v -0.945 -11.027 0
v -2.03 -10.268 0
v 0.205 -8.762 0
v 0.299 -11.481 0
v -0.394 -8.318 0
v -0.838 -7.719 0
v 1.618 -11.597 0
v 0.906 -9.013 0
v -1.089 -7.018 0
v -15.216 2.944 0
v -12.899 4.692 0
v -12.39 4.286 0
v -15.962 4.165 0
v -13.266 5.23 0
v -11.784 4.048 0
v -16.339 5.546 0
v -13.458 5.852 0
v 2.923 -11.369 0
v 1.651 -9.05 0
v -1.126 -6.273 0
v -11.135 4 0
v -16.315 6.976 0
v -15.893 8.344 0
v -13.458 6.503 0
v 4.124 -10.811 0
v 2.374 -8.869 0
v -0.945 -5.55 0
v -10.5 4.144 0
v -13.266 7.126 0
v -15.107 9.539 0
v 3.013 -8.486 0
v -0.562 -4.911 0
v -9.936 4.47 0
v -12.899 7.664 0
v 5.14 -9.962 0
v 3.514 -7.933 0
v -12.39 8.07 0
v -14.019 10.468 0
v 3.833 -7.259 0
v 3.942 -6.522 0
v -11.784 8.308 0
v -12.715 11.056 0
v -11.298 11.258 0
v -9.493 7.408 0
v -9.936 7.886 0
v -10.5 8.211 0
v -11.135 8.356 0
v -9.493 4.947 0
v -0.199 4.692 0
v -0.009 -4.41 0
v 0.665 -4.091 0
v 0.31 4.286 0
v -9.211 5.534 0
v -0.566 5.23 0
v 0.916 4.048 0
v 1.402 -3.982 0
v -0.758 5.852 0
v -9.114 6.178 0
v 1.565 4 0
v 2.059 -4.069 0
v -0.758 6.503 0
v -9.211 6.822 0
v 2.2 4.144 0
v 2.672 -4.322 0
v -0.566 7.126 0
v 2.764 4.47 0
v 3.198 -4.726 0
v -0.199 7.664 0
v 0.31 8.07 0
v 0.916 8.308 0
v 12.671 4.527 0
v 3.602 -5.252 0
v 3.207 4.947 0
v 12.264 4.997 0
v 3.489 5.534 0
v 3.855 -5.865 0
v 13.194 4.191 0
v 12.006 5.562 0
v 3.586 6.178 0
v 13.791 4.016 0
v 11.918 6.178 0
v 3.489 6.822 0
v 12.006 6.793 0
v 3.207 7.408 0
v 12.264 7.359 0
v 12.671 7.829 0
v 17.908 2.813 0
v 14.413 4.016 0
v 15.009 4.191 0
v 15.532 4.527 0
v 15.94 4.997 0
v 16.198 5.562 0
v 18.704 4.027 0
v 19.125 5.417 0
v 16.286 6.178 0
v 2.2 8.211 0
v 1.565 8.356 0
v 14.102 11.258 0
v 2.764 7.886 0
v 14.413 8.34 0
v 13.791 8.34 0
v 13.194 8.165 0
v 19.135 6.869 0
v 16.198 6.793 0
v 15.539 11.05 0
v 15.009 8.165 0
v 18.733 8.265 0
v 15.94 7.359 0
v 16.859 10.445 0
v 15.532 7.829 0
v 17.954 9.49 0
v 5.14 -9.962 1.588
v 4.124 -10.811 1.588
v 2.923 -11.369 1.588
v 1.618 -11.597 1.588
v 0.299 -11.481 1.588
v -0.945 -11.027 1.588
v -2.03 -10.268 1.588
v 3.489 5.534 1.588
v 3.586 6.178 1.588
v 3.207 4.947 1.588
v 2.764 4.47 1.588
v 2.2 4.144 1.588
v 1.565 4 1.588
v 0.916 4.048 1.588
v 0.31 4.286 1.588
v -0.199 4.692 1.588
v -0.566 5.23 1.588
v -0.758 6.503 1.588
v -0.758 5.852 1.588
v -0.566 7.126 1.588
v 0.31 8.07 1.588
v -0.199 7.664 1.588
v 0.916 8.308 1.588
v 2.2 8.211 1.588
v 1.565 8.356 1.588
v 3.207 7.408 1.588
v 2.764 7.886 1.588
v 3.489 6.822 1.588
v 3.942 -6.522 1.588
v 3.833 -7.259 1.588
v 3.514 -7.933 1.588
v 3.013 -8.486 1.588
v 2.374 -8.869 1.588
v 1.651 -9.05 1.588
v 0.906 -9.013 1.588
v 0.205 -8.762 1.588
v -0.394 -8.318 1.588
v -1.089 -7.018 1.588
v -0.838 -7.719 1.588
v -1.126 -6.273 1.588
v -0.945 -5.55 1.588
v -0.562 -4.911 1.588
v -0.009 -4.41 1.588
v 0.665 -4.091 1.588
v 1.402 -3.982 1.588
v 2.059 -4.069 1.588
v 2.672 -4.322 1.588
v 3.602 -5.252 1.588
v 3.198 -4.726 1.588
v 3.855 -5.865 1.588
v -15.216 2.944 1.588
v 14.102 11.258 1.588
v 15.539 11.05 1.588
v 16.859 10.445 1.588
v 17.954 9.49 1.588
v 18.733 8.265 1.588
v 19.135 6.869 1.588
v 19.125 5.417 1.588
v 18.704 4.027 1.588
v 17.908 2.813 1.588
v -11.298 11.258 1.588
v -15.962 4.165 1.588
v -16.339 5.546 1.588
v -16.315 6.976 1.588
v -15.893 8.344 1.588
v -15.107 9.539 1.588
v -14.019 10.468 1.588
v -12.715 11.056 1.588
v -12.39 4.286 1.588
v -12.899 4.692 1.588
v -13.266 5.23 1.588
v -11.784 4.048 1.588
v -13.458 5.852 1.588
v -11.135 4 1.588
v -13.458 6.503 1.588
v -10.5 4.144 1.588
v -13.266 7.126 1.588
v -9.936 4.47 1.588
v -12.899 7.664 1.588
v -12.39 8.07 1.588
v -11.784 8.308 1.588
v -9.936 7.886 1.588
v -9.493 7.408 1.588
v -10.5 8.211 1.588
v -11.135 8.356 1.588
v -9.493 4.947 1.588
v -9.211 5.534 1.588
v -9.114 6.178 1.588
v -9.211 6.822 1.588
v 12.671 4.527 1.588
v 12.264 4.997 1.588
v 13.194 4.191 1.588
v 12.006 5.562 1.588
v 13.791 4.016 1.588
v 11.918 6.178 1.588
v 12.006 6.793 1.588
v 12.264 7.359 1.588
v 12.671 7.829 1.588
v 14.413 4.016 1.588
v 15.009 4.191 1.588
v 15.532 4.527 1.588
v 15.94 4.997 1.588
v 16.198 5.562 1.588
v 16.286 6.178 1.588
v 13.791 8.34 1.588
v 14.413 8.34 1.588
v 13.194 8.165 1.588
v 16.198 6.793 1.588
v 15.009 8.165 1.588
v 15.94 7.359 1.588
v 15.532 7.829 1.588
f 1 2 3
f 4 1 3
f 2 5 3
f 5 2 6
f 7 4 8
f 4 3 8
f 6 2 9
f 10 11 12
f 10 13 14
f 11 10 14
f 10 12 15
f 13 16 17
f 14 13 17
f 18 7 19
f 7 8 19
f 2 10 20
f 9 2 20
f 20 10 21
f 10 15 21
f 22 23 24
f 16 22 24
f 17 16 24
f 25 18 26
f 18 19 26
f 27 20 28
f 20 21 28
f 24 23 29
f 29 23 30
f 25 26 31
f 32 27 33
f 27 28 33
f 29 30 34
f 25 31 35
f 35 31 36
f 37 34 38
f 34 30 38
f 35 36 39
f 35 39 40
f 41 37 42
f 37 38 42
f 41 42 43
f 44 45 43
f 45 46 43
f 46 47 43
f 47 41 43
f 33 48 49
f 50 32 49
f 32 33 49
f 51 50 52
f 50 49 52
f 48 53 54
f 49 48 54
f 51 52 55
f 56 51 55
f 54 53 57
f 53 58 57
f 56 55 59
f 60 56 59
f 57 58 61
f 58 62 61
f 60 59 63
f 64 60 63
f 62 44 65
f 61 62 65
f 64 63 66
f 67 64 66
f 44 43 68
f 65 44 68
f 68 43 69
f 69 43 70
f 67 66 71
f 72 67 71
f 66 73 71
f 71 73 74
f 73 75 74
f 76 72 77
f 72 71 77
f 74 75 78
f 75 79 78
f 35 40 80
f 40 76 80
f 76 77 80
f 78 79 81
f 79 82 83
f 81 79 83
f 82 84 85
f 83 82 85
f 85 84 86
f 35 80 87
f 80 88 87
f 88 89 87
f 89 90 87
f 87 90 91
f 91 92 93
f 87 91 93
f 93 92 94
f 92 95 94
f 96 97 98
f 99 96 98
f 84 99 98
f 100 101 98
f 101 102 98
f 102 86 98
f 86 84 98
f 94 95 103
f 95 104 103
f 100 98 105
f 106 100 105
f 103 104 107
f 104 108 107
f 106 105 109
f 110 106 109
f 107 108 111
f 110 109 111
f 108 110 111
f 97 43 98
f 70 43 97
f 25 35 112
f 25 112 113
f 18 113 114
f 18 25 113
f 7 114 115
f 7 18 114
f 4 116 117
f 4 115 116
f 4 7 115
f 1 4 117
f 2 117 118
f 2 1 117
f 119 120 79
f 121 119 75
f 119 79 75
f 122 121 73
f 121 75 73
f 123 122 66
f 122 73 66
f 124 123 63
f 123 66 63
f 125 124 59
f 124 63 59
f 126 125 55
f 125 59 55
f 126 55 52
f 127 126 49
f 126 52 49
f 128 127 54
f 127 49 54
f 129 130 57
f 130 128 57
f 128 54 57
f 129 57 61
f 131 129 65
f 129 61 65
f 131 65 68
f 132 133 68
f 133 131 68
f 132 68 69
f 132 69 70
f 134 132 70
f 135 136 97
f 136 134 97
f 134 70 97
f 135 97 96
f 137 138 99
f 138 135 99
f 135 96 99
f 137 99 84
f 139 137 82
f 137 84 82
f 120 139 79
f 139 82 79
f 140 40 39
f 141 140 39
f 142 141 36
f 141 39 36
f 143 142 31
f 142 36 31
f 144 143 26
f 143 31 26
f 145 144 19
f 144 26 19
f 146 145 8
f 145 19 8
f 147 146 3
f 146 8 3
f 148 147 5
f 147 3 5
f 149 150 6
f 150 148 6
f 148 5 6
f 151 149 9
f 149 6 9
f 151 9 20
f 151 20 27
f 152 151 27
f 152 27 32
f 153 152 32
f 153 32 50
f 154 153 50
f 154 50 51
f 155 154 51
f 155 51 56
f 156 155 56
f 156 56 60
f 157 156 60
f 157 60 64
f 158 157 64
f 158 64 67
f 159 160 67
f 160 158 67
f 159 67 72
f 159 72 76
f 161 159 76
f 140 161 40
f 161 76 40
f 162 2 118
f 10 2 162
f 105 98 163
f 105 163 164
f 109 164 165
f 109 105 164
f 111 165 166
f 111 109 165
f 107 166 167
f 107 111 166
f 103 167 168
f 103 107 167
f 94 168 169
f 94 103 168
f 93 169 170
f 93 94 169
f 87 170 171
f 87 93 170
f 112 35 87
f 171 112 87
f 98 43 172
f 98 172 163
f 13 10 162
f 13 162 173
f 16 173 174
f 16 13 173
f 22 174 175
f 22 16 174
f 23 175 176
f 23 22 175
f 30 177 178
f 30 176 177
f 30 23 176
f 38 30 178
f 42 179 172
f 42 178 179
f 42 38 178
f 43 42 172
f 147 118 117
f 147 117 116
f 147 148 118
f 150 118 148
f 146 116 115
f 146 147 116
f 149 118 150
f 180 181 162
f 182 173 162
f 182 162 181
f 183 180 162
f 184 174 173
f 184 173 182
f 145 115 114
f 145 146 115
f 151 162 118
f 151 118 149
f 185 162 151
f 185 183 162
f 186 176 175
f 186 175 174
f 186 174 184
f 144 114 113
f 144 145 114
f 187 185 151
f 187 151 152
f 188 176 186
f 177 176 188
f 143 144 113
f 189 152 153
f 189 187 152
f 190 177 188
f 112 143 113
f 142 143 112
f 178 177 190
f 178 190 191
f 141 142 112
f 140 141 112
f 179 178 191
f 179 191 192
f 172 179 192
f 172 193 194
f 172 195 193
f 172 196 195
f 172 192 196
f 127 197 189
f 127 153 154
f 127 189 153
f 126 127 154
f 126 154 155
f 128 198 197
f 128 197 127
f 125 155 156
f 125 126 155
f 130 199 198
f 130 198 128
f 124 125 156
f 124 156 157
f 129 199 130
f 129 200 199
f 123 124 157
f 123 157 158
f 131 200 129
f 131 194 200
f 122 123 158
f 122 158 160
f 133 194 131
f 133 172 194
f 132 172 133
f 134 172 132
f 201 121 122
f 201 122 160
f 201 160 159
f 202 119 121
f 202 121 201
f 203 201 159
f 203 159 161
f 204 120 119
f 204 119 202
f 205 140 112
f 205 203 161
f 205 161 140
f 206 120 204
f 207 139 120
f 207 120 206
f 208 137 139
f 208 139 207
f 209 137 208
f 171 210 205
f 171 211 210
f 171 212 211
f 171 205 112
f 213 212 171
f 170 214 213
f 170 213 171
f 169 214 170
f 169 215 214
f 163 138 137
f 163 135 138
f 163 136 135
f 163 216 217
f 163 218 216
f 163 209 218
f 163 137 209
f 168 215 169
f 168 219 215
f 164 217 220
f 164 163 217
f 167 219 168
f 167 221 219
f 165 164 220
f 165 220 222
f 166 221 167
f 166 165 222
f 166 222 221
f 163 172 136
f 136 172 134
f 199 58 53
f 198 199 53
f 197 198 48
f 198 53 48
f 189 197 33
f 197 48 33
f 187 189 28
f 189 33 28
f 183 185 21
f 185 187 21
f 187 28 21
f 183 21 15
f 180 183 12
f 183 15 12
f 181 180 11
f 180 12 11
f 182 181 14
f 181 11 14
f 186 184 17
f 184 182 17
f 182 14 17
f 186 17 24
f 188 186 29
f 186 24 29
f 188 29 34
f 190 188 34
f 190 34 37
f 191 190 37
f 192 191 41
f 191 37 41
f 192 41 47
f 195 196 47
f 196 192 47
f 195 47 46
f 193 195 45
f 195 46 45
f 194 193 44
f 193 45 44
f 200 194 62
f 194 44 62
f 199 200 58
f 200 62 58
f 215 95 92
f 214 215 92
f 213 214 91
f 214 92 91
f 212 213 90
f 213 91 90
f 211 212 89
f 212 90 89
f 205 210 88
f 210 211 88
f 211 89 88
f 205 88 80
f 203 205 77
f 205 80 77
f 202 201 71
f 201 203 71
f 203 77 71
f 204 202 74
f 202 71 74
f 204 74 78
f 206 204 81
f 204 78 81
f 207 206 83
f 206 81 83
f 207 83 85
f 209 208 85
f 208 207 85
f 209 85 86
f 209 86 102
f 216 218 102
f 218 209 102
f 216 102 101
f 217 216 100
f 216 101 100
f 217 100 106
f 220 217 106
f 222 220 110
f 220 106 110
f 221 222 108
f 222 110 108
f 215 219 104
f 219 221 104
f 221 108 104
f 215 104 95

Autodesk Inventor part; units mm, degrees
ref_plane "YZ Plane" through (0, 0, 0) normal (1, 0, 0) x (0, 1, 0)
ref_plane "XZ Plane" through (0, 0, 0) normal (0, 1, 0) x (-1, 0, 0)
ref_plane "XY Plane" through (0, 0, 0) normal (0, 0, 1) x (1, 0, 0)
sketch "Sketch3" plane through (0, 0, 0) normal (0, 0, 1) x (1, 0, 0)
  circle A0 centre (1.4019, 6.1779) radius 2.1844
  circle A1 centre (-11.2981, 6.1779) radius 2.1844
  circle A2 centre (-23.9981, 6.1779) radius 2.1844
  circle A3 centre (14.1019, 6.1779) radius 2.1844
  line L0 (-11.2981, 6.1779) -> (1.4019, 6.1779)
  line L1 (1.4019, 6.1779) -> (14.1019, 6.1779)
  circle A4 centre (-11.2981, 6.1779) radius 5.08
  circle A5 centre (1.4019, 6.1779) radius 5.08
  circle A6 centre (14.1019, 6.1779) radius 5.08
  line L2 (-11.2981, 11.2579) -> (1.4019, 11.2579)
  line L3 (1.4019, 11.2579) -> (14.1019, 11.2579)
  line L4 (1.4019, 6.1779) -> (1.4019, -6.5221)
  circle A7 centre (1.4019, -6.5221) radius 2.54
  circle A8 centre (1.4019, -6.5221) radius 5.08
  line L5 (-2.0302, -10.2675) -> (-18.1161, 5.8501)
  line L6 (5.1405, -9.9615) -> (17.9077, 2.813)
  point P0 (0, 0)
  point P1 (-15.8845, 3.9935)
  point P2 (18.6882, 3.9935)
  point P3 (4.8339, -10.2675)
  point P4 (-14.5389, 2.2658)
  point P5 (17.3918, 2.2658)
  point P6 (1.4019, -1.4421)
  point P7 (1.4019, 1.0979)
  point P8 (6.4819, 6.1779)
  point P9 (9.0219, 6.1779)
  point P10 (17.4689, 2.374)
  point P11 (-2.3502, -9.9468)
  point P12 (-15.2165, 2.9448)
  point P13 (-3.6781, 6.1779)
  point P14 (-6.2181, 6.1779)
  dimension "d55" = 10.16
  dimension "d54" = 10.16
  dimension "d56" = 10.16
  dimension "d59" = 4.3688
  dimension "d63" = 12.7
  dimension "d64" = 5.08
  dimension "d65" = 10.16
extrude "Extrusion7" add sketch "Sketch3" along normal blind 1.5875 contours L1 A5 L4 A0 | A0 L0 A5 L1 | A0 L4 A5 L0 | A5 L3 A6 L1 | L1 A6 L6 A8 L4 A5 | A8 | A5 L4 A8 L5 A4 L0 | L0 A4 L2 A5 | A6 L6 | A4 L5 picked at (18.1676, 5.7732) picked at (-7.2265, 5.798)
sketch "Sketch4" plane through (0, 0, 1.5875) normal (0, 0, 1) x (1, 0, 0)
  point P0 (0, 0)
properties part number "Wing poly connection"
